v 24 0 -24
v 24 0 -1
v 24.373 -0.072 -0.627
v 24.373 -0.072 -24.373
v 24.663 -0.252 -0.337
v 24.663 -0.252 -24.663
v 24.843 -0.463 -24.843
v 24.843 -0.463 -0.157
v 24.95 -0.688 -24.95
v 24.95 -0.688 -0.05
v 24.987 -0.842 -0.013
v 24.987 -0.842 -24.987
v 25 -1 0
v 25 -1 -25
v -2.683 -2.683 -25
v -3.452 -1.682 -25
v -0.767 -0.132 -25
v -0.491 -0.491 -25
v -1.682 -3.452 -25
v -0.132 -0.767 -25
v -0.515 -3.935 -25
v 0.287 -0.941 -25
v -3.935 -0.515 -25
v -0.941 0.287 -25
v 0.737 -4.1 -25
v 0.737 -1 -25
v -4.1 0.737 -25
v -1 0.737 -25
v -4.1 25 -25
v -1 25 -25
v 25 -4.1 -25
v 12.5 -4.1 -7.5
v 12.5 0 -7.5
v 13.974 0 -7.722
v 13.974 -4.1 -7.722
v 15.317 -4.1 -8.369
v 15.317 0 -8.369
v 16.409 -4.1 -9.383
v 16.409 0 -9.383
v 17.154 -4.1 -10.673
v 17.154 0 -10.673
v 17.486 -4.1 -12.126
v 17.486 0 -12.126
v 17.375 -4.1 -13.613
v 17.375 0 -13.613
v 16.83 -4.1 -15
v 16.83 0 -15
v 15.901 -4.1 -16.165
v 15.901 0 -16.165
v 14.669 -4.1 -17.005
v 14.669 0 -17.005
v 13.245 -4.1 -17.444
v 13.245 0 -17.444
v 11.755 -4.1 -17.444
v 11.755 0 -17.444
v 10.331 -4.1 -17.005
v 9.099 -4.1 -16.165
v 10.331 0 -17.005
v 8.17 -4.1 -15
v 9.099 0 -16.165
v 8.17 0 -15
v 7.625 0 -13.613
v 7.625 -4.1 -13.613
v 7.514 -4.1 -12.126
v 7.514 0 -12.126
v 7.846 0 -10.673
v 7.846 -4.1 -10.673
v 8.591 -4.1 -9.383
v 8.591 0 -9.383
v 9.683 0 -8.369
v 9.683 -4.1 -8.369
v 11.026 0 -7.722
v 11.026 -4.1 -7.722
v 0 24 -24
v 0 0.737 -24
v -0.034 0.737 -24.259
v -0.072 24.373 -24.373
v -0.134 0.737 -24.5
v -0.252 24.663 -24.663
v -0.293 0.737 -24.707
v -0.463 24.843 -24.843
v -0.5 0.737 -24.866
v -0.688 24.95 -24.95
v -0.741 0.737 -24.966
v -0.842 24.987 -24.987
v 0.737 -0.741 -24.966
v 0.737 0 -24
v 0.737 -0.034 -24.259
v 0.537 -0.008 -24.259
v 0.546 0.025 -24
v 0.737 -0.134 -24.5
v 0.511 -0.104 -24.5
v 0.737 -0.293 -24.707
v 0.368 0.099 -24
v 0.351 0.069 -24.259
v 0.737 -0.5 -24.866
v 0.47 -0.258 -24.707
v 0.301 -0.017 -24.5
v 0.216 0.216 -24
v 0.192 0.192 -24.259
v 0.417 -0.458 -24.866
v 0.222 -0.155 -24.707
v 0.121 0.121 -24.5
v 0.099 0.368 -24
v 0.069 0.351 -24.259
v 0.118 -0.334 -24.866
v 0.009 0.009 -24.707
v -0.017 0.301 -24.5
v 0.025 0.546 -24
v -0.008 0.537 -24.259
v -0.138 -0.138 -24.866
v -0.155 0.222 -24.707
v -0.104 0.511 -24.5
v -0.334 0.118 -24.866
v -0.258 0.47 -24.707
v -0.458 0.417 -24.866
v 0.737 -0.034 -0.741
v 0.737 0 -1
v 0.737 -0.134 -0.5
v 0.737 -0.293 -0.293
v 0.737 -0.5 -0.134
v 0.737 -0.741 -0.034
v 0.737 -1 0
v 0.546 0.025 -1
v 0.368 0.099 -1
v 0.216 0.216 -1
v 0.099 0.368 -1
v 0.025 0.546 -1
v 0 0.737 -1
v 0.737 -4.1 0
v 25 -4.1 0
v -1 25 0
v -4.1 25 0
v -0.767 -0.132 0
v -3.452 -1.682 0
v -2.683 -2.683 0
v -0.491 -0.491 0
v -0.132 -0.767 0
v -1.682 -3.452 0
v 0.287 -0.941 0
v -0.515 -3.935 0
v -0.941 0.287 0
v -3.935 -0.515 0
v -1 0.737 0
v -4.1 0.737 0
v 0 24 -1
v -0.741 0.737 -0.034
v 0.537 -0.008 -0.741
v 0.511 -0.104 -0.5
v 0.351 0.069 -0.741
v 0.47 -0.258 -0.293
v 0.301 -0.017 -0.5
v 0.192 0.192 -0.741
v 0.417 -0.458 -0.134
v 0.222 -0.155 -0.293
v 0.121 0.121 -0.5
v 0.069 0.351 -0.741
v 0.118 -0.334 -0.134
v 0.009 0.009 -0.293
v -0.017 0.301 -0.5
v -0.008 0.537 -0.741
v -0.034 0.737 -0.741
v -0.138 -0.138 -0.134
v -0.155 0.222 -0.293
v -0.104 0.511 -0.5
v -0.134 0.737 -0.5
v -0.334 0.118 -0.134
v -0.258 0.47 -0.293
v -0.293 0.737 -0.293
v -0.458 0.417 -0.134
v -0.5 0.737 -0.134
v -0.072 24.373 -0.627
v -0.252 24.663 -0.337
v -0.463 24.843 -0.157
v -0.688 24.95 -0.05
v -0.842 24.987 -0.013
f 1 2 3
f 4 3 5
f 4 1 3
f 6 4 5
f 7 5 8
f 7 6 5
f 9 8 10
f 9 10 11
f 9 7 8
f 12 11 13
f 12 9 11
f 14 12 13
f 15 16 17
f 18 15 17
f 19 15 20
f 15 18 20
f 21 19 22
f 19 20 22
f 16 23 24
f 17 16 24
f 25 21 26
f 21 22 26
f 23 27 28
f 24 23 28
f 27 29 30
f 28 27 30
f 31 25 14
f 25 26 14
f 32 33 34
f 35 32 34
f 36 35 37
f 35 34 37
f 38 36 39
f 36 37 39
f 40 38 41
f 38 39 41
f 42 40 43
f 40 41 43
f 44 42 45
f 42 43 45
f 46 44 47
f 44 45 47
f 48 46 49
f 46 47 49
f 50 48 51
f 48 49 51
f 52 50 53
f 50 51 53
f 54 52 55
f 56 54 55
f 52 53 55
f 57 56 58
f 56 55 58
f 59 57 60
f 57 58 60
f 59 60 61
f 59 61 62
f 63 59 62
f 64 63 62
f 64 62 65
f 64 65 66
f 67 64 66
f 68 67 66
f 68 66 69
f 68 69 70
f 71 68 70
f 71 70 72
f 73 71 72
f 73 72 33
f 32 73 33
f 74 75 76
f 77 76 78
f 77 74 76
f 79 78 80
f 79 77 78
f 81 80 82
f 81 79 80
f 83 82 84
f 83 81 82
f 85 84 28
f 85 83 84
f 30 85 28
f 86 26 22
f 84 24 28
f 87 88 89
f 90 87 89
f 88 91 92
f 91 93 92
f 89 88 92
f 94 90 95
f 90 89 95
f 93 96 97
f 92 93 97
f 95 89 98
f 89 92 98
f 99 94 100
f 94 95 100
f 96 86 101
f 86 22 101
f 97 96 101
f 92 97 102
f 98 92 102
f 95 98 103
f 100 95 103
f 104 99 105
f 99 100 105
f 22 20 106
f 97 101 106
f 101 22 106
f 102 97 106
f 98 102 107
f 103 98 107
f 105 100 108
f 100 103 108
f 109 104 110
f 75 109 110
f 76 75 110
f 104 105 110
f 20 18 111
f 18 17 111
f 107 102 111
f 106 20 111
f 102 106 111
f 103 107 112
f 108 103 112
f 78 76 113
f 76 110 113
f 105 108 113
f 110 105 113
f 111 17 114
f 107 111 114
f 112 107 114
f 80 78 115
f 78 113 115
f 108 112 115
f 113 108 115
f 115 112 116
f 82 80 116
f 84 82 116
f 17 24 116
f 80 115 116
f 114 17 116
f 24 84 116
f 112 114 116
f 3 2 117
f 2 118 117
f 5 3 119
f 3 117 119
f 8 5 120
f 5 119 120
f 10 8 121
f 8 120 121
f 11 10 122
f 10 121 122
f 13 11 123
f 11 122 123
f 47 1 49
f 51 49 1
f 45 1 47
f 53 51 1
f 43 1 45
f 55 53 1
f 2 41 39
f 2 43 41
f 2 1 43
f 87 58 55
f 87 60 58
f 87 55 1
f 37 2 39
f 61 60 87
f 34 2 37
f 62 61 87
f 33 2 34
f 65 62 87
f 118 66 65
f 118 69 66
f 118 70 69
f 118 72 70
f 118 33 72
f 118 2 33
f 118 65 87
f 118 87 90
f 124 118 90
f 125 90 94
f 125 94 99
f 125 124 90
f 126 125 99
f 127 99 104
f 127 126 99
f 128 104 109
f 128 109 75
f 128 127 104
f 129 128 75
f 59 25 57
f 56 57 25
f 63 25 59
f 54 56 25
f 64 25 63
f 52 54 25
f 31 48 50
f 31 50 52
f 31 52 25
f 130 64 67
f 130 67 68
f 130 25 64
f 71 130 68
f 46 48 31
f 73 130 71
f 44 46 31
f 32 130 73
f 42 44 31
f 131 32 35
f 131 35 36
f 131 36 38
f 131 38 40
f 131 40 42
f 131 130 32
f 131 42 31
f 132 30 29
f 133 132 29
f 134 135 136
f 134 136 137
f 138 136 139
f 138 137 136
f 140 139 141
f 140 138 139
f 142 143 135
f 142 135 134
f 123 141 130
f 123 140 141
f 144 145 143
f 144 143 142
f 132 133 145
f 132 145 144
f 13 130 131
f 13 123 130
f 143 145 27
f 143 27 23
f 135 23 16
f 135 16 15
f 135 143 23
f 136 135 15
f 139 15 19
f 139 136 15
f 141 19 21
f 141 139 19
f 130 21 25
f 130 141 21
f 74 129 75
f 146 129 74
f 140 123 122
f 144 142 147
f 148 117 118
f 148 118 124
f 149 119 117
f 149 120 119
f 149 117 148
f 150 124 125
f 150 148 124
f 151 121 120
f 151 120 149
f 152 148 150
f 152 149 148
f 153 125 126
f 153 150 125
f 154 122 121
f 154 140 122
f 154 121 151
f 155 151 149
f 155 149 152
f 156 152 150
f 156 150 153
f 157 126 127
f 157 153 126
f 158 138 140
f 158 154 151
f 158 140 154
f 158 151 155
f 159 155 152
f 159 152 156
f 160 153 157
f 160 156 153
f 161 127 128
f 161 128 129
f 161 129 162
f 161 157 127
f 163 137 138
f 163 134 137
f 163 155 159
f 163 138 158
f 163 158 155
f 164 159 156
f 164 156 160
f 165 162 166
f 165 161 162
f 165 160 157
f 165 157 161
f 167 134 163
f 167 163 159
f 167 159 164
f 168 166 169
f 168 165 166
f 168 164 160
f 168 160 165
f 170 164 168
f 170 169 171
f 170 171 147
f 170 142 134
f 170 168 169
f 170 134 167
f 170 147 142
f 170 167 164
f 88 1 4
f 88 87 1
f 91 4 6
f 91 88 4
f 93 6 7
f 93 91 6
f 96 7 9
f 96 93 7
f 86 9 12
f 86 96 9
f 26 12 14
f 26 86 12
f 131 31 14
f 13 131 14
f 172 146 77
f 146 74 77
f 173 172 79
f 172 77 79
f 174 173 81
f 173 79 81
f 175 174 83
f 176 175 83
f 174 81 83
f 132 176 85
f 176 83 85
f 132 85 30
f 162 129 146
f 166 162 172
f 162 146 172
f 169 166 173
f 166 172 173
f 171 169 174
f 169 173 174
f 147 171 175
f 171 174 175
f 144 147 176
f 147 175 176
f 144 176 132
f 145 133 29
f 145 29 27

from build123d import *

# Parameters (mm, degrees)
BASE_FLANGE1_DEPTH = 25
FILLET1_R          = 1
SKETCH6_R          = 5
CUT_EXTRUDE1_DEPTH = 10


# Sheet-metal steps are written as plain solids
with BuildPart() as part:
    # Sketch1 → Base-Flange1 (new body)
    with BuildSketch(Plane.XY):
        with BuildLine():
            Line((25, 0), (0.7366, 0))
            ThreePointArc((0.7366, 0), (0.215745145, 0.215745145), (0, 0.7366))
            Line((0, 0.7366), (0, 25))
            Line((0, 25), (-4.1, 25))
            Line((-4.1, 25), (-4.1, 0.7366))
            ThreePointArc((-4.1, 0.7366), (-2.683392658, -2.683392658), (0.7366, -4.1))
            Line((0.7366, -4.1), (25, -4.1))
            Line((25, -4.1), (25, 0))
        make_face()
    extrude(amount=-BASE_FLANGE1_DEPTH)

    # Fillet1
    fillet1_edges = [part.edges().sort_by_distance(p)[0] for p in [
        (0, 25, -12.5),
        (12.8683, 0, -25),
        (25, 0, -12.5),
        (0.215745145, 0.215745145, -25),
        (0, 12.8683, -25),
        (0, 12.8683, 0),
        (0.215745145, 0.215745145, 0),
        (12.8683, 0, 0),
    ]]
    fillet(fillet1_edges, radius=FILLET1_R)

    # Sketch6 → Cut-Extrude1 (cut)
    with BuildSketch(Plane(origin=(0, 0, 0), x_dir=(1, 0, 0), z_dir=(0, 1, 0))):
        with Locations(Location((12.5, 12.5, 0), (0, 0, 270))):
            Circle(SKETCH6_R)
    extrude(amount=-CUT_EXTRUDE1_DEPTH, mode=Mode.SUBTRACT)


solid = part.part
